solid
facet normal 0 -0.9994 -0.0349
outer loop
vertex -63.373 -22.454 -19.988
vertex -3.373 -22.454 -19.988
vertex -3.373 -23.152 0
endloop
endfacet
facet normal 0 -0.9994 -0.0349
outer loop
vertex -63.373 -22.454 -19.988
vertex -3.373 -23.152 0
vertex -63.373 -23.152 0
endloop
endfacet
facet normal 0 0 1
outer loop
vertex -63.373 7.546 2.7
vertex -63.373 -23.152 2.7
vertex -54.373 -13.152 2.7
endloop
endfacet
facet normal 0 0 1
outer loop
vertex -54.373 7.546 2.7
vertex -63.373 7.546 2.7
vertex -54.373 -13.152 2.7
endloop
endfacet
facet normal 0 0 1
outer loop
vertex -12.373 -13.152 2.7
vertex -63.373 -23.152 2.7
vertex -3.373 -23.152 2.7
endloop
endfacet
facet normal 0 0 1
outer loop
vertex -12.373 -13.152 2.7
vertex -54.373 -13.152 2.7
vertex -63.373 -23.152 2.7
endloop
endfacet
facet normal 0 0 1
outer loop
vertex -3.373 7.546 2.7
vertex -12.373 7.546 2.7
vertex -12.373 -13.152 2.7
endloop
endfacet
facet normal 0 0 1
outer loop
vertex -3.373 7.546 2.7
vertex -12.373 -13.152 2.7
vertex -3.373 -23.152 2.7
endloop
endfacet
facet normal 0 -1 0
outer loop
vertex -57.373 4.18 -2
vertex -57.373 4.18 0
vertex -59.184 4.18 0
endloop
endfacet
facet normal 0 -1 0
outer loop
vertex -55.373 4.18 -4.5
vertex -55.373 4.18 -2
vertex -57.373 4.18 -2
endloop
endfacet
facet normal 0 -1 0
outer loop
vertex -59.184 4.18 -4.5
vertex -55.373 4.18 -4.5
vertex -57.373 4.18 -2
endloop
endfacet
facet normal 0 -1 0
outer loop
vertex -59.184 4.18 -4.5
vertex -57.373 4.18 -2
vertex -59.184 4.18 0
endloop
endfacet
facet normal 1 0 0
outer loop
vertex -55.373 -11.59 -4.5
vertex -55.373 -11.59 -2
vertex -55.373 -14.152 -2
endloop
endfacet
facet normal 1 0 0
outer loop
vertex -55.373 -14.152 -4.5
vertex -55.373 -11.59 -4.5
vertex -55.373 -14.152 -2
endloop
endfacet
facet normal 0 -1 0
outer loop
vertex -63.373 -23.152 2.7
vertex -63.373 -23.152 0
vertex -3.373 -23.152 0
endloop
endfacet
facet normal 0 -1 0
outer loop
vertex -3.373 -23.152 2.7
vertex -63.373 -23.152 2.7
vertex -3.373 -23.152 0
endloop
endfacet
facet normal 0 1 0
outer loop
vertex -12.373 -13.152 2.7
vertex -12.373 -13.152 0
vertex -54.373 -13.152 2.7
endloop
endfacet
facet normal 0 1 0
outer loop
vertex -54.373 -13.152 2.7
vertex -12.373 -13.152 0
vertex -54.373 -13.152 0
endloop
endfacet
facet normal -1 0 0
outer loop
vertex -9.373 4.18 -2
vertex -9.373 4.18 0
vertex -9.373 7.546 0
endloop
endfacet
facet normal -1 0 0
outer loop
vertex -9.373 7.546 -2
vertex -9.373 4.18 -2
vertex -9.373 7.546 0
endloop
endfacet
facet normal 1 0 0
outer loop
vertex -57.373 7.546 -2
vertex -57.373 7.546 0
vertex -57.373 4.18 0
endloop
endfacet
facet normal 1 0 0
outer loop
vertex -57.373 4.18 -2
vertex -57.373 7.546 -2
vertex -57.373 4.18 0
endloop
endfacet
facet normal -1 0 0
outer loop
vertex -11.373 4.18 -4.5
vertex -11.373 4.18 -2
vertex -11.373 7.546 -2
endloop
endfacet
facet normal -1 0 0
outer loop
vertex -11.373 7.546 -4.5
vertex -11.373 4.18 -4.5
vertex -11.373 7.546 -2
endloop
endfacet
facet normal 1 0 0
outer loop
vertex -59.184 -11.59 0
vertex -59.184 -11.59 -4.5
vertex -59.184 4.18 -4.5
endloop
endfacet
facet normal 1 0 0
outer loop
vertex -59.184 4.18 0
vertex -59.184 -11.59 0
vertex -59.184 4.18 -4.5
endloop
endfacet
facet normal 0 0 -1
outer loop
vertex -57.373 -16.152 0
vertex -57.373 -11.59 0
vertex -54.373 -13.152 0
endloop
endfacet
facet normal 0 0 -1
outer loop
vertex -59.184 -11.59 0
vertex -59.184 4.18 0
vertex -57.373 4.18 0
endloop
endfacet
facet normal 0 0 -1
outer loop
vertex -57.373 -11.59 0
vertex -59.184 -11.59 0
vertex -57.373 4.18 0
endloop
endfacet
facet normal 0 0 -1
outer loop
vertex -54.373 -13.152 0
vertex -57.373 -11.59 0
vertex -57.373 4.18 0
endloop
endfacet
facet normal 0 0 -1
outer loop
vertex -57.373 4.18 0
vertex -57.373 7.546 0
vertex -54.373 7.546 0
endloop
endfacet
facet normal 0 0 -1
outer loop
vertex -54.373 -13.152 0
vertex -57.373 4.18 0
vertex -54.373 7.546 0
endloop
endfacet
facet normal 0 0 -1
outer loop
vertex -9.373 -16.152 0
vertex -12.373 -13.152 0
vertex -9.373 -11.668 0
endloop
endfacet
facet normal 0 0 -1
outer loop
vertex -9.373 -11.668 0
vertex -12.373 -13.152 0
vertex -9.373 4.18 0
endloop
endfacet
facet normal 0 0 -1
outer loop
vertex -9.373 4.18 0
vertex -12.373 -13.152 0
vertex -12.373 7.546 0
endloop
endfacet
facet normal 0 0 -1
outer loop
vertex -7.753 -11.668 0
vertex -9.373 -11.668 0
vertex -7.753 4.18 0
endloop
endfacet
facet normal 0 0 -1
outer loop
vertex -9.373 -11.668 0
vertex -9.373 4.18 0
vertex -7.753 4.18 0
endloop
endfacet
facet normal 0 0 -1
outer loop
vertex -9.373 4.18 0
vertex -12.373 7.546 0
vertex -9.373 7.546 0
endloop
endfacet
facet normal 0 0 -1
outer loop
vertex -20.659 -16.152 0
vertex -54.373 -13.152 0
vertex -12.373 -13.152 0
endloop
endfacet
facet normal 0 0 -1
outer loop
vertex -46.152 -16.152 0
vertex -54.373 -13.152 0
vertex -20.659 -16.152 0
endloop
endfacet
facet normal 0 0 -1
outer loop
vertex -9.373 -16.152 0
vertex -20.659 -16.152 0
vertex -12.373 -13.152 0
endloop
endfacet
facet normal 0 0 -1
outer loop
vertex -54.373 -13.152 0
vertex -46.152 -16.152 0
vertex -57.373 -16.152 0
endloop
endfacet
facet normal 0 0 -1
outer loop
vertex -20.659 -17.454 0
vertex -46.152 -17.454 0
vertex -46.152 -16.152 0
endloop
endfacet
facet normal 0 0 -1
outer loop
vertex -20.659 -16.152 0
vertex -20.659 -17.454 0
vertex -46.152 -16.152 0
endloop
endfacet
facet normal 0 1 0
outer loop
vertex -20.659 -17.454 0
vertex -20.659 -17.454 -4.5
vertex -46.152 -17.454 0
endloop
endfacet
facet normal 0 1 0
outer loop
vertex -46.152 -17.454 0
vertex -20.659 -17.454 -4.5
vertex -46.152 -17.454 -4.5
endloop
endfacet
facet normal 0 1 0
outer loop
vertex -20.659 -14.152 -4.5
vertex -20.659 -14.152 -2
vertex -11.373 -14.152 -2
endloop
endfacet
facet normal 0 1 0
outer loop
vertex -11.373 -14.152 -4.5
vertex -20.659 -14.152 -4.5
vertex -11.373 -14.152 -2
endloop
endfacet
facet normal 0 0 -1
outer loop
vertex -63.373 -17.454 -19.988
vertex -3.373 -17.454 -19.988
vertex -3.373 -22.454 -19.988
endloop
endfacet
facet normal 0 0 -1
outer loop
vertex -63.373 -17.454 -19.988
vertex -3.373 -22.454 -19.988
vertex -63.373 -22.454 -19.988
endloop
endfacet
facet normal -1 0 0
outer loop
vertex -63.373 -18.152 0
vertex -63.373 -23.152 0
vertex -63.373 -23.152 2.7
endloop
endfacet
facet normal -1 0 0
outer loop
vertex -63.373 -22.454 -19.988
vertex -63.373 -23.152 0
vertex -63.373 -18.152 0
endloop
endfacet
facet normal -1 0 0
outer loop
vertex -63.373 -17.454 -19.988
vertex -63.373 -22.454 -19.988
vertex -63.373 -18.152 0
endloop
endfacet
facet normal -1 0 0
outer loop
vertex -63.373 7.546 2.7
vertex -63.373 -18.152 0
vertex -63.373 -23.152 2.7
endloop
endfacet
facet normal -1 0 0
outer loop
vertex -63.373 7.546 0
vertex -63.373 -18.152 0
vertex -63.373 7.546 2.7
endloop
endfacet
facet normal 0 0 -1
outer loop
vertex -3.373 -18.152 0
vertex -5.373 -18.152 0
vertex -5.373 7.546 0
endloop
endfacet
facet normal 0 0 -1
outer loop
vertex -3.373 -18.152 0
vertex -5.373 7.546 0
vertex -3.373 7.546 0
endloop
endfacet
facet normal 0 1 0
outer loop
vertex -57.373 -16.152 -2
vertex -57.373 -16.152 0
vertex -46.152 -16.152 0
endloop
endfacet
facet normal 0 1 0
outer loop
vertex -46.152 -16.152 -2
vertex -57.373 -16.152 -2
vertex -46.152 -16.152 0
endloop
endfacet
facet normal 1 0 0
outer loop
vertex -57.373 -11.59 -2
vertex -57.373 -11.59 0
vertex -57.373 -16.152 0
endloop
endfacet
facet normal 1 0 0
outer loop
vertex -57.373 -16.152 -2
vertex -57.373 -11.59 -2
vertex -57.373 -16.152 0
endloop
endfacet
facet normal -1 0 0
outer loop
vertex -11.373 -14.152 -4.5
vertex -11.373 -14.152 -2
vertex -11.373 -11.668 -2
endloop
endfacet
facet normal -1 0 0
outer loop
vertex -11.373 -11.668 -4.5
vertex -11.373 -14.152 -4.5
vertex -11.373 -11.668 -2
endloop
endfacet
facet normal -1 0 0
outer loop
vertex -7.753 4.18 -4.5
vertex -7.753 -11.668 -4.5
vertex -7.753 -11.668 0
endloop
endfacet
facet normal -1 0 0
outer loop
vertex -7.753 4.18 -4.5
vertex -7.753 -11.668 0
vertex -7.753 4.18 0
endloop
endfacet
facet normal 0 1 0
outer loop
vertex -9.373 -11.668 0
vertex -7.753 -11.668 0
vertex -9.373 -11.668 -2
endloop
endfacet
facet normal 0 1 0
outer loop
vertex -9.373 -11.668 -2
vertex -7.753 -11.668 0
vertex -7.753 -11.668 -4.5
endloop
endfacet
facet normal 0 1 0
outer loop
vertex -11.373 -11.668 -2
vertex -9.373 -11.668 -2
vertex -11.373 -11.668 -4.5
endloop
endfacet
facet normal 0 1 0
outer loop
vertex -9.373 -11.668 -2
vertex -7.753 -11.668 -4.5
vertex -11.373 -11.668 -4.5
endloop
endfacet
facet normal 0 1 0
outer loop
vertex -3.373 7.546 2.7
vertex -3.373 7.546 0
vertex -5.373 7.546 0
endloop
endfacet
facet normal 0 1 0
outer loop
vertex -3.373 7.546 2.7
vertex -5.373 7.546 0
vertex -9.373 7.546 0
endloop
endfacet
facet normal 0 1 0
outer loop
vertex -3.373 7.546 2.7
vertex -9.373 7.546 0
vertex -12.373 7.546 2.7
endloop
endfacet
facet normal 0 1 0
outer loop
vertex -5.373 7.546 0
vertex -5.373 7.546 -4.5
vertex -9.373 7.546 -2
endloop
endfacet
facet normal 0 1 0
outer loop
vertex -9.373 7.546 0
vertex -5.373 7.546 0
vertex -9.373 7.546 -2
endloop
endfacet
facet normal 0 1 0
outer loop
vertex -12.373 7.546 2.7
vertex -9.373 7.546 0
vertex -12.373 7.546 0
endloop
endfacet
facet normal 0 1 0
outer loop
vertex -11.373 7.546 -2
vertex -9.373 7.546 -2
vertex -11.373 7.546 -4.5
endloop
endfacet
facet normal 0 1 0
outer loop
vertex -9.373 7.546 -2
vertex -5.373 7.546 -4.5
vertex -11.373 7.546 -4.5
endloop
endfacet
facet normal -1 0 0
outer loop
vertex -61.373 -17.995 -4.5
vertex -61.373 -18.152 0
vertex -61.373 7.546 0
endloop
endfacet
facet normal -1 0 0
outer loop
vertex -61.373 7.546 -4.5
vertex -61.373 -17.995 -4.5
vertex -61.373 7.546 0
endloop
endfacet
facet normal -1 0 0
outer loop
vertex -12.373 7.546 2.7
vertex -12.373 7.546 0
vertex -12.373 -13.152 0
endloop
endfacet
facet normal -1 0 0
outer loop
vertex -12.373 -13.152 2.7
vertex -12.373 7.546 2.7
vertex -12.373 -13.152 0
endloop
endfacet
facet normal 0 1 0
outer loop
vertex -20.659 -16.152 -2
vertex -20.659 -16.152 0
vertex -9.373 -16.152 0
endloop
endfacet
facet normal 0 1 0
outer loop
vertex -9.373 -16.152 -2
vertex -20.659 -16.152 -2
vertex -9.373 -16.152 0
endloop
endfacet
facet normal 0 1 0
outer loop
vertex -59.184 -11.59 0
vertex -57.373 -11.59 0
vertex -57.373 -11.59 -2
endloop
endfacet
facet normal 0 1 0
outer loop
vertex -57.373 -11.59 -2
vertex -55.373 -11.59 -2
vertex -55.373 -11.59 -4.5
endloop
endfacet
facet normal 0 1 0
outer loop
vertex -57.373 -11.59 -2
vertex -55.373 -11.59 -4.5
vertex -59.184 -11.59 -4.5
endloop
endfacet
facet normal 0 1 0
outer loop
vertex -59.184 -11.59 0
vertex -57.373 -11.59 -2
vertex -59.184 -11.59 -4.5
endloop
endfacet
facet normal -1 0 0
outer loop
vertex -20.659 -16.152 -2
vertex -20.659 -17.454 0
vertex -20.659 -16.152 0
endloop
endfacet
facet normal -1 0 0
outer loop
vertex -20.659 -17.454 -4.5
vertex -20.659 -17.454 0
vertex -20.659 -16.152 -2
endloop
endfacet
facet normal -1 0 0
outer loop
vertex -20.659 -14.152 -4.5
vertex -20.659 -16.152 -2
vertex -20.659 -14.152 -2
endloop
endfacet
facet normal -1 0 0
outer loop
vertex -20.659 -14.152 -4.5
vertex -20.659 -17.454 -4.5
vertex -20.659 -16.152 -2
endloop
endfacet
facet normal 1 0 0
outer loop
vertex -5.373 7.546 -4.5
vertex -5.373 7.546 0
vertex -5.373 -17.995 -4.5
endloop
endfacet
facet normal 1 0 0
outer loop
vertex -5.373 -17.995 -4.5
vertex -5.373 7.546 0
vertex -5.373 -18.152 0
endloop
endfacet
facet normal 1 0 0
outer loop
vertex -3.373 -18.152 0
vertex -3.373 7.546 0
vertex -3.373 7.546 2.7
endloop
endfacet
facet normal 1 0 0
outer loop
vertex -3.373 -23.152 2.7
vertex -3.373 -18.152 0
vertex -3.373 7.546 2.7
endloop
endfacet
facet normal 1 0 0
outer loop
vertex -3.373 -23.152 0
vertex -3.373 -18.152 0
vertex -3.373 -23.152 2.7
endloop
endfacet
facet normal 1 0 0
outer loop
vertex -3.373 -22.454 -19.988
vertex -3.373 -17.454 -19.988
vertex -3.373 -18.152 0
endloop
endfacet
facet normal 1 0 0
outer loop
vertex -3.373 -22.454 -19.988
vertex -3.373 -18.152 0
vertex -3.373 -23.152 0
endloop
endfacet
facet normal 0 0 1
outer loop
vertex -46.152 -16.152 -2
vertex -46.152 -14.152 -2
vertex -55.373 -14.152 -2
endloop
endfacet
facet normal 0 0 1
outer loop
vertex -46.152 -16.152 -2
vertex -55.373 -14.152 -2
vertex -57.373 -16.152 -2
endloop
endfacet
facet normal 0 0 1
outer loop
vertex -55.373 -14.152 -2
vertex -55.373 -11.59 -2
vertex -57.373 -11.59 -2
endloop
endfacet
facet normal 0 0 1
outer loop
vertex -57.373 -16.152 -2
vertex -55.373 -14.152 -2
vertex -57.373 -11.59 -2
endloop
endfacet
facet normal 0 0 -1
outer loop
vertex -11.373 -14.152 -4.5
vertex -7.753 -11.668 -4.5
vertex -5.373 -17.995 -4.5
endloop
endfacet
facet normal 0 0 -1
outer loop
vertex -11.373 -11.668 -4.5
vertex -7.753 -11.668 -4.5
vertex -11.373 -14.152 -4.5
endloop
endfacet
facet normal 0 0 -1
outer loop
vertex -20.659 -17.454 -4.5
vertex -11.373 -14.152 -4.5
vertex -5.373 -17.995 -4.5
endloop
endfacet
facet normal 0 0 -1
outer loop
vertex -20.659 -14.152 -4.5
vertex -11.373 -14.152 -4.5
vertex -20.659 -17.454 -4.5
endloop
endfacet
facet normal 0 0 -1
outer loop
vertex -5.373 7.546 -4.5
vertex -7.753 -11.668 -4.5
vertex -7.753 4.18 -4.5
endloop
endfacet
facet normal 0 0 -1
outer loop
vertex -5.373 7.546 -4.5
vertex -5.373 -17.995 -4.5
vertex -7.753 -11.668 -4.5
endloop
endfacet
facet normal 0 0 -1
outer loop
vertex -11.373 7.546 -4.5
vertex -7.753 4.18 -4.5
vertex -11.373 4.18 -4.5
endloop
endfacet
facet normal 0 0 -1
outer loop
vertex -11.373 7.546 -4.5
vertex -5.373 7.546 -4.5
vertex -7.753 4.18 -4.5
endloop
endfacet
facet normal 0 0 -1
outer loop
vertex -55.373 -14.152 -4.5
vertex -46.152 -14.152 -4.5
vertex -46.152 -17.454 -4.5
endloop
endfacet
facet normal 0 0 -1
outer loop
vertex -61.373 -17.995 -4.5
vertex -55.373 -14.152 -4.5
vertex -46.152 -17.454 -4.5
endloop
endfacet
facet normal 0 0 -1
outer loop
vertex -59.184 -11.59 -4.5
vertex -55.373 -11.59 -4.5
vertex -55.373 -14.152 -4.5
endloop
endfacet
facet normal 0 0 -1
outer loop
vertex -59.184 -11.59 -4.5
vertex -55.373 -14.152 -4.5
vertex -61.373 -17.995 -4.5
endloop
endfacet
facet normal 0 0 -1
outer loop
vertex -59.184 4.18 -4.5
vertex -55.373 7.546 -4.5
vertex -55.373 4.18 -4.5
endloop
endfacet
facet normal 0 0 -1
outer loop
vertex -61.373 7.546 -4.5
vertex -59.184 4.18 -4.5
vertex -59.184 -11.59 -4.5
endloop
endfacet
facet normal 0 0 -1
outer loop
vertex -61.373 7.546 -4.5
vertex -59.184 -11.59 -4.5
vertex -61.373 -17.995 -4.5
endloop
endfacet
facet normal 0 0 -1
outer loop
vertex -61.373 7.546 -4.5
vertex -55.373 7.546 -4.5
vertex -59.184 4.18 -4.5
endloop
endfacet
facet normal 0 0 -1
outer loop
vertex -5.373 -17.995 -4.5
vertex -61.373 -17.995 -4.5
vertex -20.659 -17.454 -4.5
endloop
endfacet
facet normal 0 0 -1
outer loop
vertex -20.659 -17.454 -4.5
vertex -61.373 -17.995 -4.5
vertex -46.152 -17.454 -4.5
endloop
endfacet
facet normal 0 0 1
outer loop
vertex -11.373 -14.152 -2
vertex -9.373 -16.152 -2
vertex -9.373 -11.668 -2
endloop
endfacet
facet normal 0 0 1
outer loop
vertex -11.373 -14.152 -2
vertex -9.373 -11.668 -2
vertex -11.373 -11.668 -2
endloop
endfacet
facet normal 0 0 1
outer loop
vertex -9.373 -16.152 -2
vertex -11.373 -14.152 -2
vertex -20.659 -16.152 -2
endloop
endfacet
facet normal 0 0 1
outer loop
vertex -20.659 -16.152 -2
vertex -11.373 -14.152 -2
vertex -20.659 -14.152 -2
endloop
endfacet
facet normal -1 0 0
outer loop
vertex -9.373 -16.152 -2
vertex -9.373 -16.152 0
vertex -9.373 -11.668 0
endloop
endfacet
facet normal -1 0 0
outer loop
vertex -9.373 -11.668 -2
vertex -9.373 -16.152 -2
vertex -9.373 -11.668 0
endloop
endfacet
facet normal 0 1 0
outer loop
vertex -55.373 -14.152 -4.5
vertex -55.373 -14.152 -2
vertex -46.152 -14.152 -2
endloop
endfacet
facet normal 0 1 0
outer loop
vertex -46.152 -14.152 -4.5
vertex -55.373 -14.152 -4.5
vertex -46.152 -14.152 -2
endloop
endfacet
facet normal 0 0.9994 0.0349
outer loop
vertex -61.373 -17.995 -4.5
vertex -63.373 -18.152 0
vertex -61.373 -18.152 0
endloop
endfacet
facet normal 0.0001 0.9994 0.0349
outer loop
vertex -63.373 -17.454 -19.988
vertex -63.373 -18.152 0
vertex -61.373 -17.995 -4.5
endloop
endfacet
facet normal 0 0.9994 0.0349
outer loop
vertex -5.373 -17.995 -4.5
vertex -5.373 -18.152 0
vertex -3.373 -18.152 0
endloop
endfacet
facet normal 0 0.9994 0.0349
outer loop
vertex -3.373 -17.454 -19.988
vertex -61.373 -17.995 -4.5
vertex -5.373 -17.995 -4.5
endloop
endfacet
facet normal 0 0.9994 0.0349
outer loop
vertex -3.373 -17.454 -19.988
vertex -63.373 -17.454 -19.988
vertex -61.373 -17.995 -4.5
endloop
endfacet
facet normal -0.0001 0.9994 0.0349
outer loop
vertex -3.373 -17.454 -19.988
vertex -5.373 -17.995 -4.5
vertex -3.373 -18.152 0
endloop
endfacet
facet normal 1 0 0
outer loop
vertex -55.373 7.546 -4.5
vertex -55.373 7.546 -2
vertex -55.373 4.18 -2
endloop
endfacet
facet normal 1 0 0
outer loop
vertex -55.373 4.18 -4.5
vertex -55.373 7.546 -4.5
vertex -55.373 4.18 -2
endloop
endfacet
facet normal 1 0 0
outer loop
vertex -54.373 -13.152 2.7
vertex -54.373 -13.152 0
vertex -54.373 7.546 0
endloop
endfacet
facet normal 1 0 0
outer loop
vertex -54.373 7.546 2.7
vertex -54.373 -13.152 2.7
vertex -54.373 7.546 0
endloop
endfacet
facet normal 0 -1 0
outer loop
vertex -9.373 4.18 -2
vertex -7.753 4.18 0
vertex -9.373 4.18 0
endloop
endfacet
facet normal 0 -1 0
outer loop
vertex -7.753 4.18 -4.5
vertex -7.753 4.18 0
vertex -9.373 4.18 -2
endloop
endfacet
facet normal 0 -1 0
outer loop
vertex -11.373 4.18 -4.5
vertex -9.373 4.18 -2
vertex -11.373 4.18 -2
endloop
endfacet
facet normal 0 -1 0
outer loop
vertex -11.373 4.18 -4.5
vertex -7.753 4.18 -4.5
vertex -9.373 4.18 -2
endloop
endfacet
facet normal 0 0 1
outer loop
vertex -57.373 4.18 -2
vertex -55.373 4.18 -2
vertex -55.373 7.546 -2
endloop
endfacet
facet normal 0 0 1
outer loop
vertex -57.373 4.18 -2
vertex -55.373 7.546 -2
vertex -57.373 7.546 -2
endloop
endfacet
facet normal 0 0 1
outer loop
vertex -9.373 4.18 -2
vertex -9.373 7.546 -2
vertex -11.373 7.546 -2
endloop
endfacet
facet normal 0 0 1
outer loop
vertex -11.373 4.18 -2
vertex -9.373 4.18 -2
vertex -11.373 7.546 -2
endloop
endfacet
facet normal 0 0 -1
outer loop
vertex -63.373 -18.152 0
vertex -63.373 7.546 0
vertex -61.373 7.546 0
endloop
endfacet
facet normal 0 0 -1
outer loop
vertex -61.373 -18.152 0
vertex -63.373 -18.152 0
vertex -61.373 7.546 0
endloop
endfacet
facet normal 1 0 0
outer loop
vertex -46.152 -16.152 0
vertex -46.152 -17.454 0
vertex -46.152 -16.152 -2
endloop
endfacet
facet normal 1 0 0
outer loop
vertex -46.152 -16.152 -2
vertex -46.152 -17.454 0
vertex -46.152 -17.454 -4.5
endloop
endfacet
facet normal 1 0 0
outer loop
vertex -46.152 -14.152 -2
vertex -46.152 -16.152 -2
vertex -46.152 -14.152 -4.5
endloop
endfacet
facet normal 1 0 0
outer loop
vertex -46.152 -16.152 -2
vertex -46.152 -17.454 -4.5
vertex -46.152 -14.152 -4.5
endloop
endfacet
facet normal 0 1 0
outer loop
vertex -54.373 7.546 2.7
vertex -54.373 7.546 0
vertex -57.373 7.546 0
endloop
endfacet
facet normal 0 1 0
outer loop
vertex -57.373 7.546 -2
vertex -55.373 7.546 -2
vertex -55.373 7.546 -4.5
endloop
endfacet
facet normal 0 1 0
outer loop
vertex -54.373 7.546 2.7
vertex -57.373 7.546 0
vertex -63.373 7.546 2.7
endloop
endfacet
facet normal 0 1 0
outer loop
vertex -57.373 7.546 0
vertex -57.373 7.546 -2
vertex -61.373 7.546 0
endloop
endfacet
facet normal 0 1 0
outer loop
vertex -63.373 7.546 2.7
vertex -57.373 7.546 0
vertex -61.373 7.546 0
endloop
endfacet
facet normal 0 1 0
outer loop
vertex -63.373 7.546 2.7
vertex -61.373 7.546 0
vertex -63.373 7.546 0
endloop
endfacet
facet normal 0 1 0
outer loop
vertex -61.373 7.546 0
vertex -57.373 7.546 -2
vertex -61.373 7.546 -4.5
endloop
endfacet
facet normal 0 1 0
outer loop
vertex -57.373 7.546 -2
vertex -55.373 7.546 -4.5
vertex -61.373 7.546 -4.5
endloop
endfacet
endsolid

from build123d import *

# Parameters (mm, degrees)
BOSS_EXTRUDE1_DEPTH = 2.7
BOSS_EXTRUDE2_DEPTH = 2
BOSS_EXTRUDE3_DEPTH = 2.5
SKETCH9_W           = 60
SKETCH9_H           = 5
CUT_EXTRUDE6_DEPTH  = 10
SKETCH11_W          = 25.492902138
SKETCH11_H          = 3.302010066
SKETCH11_W_2        = 3.620048782
SKETCH11_H_2        = 15.848017525
SKETCH11_W_3        = 3.810768748
SKETCH11_H_3        = 15.769779212
CUT_EXTRUDE7_DEPTH  = 4.5


with BuildPart() as part:
    # Sketch1 → Boss-Extrude1 (new body)
    with BuildSketch(Plane.XY):
        Polygon((-54.373493976, 36.84753086), (-63.373493976, 36.84753086), (-63.373493976, -23.15246914), (-3.373493976, -23.15246914), (-3.373493976, 36.84753086), (-12.373493976, 36.84753086), (-12.373493976, -13.15246914), (-54.373493976, -13.15246914), align=None)
    extrude(amount=BOSS_EXTRUDE1_DEPTH)

    # Sketch3 → Boss-Extrude2 (add)
    with BuildSketch(Plane(origin=(0, 0, 0), x_dir=(-1, 0, 0), z_dir=(0, 0, -1))):
        Polygon((9.373493976, -16.15246914), (9.373493976, 36.84753086), (5.373493976, 36.84753086), (5.373493976, -20.15246914), (61.373493976, -20.15246914), (61.373493976, 36.84753086), (57.373493976, 36.84753086), (57.373493976, -16.15246914), align=None)
    extrude(amount=BOSS_EXTRUDE2_DEPTH)

    # Sketch4 → Boss-Extrude3 (add)
    with BuildSketch(Plane(origin=(0, 0, -2), x_dir=(-1, 0, 0), z_dir=(0, 0, -1))):
        Polygon((55.373493976, 36.84753086), (55.373493976, -14.15246914), (11.373493976, -14.15246914), (11.373493976, 36.84753086), (5.373493976, 36.84753086), (5.373493976, -20.15246914), (61.373493976, -20.15246914), (61.373493976, 36.84753086), align=None)
    extrude(amount=BOSS_EXTRUDE3_DEPTH)

    # Sweep1: sweep along a curve in space
    with BuildLine() as sweep1_path:
        Line((-33.373493976, -20.65246914, 0), (-33.373493976, -19.954479206, -19.98781654))
    # Sketch9 → Sweep1 (sweep)
    with BuildSketch(Plane(origin=(0, 0, 0), x_dir=(-1, 0, 0), z_dir=(0, 0, -1))):
        with Locations((33.373493976, -20.65246914)):
            Rectangle(SKETCH9_W, SKETCH9_H)
    sweep(path=sweep1_path.line)

    # Sketch10 → Cut-Extrude6 (cut)
    with BuildSketch(Plane(origin=(0, 0, -4.5), x_dir=(-1, 0, 0), z_dir=(0, 0, -1))):
        Polygon((3.373493976, 7.545520794), (63.373493976, 7.545520794), (73.535080065, 7.545520794), (73.535080065, 46.239057039), (-7.104014128, 46.239057039), (-7.104014128, 7.545520794), align=None)
    extrude(amount=-CUT_EXTRUDE6_DEPTH, mode=Mode.SUBTRACT)

    # Sketch11 → Cut-Extrude7 (cut)
    with BuildSketch(Plane(origin=(0, 0, -4.5), x_dir=(-1, 0, 0), z_dir=(0, 0, -1))):
        with Locations((33.405280637, -15.803474173)):
            Rectangle(SKETCH11_W, SKETCH11_H)
        with Locations((9.563469585, -3.743911731)):
            Rectangle(SKETCH11_W_2, SKETCH11_H_2)
        with Locations((57.27887835, -3.704792574)):
            Rectangle(SKETCH11_W_3, SKETCH11_H_3)
    extrude(amount=-CUT_EXTRUDE7_DEPTH, mode=Mode.SUBTRACT)


solid = part.part
